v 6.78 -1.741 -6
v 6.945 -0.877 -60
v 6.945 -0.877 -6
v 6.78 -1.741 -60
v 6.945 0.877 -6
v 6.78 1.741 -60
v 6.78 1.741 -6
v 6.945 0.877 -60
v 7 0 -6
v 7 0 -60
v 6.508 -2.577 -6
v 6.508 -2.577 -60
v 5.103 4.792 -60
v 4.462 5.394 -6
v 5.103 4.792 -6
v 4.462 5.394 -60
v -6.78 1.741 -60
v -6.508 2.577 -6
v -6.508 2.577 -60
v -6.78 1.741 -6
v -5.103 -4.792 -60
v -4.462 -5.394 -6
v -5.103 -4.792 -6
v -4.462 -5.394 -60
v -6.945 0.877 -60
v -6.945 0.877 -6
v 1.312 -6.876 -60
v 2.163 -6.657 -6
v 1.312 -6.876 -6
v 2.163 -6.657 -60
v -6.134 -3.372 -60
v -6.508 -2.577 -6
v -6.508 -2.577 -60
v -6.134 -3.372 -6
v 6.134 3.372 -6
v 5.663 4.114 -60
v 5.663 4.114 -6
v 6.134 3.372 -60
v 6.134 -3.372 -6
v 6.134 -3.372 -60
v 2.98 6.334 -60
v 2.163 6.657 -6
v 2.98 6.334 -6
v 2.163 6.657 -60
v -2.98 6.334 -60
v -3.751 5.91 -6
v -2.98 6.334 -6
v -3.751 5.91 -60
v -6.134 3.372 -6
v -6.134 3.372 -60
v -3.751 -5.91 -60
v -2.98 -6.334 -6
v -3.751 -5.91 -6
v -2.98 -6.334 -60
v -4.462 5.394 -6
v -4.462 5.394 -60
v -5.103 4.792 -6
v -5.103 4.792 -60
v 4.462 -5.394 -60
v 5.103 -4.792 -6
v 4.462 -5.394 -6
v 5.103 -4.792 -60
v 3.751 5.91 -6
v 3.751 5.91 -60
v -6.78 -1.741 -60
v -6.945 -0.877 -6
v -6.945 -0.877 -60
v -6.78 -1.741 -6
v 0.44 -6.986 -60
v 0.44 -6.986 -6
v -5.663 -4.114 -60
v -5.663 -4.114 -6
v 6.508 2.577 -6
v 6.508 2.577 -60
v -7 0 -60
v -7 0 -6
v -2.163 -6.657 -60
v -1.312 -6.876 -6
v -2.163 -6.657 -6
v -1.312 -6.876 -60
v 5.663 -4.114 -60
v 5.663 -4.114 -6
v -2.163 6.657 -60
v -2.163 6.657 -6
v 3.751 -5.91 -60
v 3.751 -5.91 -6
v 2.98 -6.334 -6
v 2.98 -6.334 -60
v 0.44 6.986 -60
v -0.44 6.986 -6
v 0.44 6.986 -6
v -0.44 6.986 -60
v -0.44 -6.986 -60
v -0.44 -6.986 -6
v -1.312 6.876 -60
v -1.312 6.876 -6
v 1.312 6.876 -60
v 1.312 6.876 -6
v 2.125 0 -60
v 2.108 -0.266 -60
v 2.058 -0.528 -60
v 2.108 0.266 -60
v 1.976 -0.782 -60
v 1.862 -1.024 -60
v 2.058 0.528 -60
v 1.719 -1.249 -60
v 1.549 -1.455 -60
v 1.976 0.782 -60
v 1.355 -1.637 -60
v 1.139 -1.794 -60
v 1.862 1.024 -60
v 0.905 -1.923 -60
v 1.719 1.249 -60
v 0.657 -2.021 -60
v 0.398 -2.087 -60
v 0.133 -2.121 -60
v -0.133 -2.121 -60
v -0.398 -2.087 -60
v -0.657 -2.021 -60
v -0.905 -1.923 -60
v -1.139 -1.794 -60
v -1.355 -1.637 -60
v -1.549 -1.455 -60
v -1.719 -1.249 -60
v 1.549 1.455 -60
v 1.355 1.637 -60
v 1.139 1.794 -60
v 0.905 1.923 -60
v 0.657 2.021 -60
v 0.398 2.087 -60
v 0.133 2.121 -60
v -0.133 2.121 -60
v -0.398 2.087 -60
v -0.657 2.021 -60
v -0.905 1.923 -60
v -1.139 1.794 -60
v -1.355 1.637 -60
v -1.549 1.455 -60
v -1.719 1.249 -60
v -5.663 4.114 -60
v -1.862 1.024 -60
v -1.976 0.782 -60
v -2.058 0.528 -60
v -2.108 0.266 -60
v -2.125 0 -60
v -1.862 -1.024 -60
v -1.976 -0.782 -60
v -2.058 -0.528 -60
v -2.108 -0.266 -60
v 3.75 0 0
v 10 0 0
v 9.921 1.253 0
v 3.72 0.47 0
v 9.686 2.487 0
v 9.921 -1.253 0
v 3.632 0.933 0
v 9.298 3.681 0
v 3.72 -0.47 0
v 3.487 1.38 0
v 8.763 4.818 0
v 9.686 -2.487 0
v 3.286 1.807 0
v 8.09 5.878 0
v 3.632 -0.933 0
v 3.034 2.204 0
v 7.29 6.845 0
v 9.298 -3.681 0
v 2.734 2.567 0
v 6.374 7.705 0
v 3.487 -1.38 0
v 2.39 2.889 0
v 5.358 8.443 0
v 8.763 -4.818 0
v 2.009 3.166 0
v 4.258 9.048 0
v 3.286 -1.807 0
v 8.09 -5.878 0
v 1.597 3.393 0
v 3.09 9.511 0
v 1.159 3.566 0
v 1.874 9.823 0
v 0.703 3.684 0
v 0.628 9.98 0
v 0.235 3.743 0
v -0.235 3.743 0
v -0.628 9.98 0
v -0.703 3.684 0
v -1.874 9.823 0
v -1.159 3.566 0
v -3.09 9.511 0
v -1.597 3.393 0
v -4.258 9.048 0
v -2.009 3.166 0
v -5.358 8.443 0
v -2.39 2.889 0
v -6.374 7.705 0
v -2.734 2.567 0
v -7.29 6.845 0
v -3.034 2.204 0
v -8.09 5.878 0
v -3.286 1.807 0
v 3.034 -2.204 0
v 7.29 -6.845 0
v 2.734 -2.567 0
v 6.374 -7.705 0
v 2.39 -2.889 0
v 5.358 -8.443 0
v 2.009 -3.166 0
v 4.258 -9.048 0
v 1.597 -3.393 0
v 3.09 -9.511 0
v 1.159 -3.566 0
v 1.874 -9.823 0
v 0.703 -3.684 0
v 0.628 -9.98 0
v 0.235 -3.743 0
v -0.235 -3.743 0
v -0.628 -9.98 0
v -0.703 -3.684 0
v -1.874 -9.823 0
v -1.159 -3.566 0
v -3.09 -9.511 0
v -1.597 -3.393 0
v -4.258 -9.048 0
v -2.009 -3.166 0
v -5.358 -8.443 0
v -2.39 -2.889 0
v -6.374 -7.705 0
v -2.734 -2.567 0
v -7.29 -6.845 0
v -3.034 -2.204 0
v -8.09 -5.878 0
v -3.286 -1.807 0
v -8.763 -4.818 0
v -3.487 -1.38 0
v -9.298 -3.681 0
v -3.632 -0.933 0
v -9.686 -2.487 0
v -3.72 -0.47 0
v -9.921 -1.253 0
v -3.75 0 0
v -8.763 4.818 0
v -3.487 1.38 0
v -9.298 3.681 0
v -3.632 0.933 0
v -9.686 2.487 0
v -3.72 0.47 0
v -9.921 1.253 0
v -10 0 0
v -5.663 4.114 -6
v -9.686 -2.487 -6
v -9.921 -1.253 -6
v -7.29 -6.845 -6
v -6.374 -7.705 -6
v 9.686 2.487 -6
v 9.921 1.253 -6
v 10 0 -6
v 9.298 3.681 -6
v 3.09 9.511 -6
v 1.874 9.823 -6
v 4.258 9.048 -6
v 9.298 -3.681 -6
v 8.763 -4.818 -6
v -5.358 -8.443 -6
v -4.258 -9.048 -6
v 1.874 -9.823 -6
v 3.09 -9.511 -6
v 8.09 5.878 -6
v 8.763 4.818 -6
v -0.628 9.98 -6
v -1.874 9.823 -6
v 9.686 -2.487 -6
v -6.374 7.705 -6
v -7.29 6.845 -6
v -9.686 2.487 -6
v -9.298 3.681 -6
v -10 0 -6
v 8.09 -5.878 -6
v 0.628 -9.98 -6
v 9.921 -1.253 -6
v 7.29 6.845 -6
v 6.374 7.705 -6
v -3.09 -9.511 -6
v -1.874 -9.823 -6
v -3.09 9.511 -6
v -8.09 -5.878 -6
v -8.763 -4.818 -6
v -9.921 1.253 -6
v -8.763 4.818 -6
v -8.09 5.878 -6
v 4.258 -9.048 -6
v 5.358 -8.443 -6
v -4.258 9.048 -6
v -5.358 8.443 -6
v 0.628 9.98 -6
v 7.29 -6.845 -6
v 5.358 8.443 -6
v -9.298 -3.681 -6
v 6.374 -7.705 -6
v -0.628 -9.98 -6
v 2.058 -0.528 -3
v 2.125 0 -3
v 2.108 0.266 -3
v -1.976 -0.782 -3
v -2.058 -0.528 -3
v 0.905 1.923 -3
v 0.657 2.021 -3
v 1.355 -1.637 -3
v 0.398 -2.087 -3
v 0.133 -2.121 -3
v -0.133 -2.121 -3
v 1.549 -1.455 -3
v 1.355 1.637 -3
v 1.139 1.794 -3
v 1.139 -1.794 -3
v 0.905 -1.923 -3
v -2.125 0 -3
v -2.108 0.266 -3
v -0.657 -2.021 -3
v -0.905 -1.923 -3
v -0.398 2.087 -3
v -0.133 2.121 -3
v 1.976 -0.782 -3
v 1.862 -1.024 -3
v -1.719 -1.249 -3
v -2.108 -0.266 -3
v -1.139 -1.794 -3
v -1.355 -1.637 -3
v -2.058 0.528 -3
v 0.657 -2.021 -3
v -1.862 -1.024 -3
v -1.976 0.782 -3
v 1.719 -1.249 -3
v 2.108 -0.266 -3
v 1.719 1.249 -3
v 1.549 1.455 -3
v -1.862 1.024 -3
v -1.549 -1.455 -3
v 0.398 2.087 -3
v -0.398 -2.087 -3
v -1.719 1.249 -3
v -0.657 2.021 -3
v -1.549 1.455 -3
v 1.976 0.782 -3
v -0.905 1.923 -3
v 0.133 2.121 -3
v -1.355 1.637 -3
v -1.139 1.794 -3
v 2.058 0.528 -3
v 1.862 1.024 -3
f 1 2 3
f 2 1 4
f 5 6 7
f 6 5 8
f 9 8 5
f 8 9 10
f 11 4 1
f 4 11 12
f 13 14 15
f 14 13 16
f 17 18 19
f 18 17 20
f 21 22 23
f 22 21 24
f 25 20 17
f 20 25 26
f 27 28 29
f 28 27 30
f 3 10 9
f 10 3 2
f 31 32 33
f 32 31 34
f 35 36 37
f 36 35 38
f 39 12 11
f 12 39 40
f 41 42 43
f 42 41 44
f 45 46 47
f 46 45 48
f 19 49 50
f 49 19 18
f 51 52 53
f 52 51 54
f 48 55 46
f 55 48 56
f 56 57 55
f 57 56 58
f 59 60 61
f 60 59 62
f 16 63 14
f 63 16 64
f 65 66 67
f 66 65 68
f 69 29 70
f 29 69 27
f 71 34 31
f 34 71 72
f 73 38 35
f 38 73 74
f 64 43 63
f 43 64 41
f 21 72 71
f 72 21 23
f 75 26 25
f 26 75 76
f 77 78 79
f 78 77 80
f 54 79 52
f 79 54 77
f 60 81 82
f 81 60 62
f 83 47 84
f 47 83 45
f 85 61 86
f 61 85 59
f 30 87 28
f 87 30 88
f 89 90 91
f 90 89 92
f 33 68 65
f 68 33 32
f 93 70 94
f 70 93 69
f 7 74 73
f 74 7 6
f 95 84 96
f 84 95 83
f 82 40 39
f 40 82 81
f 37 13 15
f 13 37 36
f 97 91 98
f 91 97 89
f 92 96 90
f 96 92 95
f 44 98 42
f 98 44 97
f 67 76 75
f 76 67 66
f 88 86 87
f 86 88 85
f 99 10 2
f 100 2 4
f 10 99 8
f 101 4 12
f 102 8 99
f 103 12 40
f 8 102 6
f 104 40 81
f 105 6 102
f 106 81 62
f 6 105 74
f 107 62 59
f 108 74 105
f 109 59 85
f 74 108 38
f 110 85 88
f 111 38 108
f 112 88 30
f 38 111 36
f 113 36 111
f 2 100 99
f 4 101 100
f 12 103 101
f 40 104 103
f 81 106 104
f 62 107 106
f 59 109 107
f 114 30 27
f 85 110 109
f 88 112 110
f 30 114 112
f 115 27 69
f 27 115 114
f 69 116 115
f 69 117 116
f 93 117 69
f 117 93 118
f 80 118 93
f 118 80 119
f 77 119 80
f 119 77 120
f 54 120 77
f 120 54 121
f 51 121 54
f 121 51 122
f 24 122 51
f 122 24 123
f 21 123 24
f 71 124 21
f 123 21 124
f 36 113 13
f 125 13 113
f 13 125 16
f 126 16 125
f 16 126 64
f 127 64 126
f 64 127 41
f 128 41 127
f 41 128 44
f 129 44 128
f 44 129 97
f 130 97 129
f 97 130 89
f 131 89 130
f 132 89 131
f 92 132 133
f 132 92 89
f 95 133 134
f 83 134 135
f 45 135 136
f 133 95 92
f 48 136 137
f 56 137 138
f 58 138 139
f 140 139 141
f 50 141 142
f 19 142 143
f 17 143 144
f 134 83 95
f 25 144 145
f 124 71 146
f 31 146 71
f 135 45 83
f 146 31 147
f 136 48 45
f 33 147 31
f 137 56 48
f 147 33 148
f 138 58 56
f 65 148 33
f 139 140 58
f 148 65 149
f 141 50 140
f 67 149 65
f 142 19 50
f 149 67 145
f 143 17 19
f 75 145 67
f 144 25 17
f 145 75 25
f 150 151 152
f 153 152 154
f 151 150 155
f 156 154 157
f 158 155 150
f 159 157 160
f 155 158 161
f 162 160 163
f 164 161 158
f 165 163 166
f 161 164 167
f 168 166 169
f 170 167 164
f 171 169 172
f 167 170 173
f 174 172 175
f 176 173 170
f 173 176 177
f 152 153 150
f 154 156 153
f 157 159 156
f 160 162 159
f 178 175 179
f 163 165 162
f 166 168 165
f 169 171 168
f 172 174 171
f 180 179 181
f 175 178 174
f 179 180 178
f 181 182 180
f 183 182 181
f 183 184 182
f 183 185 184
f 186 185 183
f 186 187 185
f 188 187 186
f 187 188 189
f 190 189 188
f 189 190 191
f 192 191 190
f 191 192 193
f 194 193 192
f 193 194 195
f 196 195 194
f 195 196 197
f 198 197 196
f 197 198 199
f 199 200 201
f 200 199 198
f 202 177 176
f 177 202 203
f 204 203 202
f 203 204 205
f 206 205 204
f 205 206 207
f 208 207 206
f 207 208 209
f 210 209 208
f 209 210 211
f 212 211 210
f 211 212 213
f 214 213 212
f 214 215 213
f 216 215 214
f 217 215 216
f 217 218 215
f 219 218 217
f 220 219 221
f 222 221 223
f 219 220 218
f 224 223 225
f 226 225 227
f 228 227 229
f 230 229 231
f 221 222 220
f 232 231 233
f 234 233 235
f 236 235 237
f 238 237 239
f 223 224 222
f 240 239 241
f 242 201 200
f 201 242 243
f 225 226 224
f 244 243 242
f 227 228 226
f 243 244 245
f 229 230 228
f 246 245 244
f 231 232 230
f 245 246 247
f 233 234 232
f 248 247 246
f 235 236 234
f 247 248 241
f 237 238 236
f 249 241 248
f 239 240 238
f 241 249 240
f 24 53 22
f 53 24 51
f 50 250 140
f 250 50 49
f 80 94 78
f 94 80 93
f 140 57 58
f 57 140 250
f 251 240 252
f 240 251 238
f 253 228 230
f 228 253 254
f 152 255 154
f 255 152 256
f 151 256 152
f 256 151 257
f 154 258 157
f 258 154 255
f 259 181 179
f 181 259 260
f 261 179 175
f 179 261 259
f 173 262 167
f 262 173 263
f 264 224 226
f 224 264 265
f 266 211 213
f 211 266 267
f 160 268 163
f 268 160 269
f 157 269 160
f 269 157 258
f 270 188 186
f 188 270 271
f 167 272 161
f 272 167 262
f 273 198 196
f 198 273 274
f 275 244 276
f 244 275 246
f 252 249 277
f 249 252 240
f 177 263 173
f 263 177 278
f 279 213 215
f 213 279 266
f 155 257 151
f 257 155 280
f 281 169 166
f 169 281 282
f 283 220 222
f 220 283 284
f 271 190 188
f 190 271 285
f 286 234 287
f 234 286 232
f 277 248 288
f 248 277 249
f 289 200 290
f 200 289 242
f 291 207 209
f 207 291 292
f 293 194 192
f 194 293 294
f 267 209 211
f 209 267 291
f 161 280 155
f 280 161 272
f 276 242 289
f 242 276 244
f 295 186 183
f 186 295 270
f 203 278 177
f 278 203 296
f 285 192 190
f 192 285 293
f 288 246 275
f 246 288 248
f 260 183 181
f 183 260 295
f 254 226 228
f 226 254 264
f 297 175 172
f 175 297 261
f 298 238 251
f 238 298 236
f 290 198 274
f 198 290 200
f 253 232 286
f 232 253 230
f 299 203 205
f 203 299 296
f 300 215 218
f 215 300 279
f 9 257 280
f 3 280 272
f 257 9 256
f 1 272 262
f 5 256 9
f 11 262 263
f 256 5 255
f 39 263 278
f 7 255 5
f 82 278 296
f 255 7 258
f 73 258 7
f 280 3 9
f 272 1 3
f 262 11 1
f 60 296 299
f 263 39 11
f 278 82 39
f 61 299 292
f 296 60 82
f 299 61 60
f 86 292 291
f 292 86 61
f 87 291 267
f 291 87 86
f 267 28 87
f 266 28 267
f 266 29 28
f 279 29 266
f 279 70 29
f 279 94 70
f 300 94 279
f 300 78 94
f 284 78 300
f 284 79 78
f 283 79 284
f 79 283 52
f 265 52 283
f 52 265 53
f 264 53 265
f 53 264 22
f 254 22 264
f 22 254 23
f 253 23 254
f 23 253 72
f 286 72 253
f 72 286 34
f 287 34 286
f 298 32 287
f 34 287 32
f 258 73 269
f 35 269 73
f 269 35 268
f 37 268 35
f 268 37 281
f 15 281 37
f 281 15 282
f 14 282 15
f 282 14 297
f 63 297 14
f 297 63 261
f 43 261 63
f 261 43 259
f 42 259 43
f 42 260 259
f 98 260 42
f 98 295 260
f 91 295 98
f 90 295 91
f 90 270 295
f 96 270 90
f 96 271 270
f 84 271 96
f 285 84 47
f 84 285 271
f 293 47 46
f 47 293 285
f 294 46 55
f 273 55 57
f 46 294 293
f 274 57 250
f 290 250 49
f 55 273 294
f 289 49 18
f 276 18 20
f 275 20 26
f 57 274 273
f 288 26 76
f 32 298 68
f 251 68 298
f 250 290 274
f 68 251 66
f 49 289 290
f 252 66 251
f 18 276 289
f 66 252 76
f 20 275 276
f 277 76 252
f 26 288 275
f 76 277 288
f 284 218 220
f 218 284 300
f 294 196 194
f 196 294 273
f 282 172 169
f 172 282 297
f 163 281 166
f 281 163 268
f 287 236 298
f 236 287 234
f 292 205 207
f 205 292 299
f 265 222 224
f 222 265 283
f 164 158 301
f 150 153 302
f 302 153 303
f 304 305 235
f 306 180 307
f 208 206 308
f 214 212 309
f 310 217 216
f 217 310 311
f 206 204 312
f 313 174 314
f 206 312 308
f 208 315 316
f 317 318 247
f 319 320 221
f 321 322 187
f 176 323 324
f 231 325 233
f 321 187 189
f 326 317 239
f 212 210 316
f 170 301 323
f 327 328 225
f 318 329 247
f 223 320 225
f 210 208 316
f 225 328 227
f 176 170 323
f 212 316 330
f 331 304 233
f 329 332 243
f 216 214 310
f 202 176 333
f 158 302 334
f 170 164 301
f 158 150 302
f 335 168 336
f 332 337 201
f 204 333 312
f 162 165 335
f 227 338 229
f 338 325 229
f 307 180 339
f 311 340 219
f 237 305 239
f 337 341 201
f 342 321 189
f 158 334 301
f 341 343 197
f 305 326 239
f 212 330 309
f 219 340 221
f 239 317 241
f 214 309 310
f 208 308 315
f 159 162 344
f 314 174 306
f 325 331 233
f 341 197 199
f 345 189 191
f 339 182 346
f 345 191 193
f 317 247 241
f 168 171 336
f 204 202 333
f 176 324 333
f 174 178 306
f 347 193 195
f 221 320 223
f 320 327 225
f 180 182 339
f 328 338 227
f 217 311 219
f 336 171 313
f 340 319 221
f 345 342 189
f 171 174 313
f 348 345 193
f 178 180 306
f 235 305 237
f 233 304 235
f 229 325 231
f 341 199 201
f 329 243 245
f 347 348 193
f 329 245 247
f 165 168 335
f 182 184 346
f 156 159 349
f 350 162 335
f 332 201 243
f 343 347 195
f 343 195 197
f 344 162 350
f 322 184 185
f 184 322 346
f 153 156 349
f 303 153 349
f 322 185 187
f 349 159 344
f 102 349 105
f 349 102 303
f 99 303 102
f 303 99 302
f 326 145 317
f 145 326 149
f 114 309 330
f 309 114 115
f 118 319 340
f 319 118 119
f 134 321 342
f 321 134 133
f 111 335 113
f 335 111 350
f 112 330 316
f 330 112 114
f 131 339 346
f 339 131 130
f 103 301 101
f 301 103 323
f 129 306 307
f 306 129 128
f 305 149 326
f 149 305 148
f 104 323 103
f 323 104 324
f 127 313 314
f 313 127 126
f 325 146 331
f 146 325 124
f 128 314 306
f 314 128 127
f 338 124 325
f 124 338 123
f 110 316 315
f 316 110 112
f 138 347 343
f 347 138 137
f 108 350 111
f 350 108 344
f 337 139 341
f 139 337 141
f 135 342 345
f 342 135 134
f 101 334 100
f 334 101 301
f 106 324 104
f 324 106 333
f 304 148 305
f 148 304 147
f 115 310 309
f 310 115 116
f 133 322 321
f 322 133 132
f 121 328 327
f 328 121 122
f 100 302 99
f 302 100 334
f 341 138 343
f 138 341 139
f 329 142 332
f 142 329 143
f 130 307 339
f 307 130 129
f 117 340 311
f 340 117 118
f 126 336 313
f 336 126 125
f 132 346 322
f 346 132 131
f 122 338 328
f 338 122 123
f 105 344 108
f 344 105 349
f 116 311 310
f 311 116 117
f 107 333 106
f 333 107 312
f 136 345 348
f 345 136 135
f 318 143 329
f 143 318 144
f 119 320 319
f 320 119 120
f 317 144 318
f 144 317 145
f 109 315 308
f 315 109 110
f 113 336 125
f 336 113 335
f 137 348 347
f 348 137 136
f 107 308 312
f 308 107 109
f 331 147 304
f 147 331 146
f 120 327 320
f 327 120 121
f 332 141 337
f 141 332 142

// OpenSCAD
$fn = 50;


difference() {
	union() {
		translate(v = [0, 0, -60.0000000000]) {
			cylinder(h = 60, r = 7.0000000000);
		}
		translate(v = [0, 0, -6.0000000000]) {
			cylinder(h = 6, r = 10.0000000000);
		}
	}
	union() {
		translate(v = [0, 0, 0]) {
			rotate(a = [0, 0, 0]) {
				difference() {
					union() {
						#translate(v = [0, 0, -60.0000000000]) {
							cylinder(h = 60, r = 2.0000000000);
						}
						#translate(v = [0, 0, -3]) {
							cylinder(h = 3, r1 = 2.1250000000, r2 = 3.7500000000);
						}
						#translate(v = [0, 0, -60.0000000000]) {
							cylinder(h = 60, r = 2.1250000000);
						}
						#translate(v = [0, 0, -60.0000000000]) {
							cylinder(h = 60, r = 2.0000000000);
						}
					}
					union();
				}
			}
		}
	}
}
